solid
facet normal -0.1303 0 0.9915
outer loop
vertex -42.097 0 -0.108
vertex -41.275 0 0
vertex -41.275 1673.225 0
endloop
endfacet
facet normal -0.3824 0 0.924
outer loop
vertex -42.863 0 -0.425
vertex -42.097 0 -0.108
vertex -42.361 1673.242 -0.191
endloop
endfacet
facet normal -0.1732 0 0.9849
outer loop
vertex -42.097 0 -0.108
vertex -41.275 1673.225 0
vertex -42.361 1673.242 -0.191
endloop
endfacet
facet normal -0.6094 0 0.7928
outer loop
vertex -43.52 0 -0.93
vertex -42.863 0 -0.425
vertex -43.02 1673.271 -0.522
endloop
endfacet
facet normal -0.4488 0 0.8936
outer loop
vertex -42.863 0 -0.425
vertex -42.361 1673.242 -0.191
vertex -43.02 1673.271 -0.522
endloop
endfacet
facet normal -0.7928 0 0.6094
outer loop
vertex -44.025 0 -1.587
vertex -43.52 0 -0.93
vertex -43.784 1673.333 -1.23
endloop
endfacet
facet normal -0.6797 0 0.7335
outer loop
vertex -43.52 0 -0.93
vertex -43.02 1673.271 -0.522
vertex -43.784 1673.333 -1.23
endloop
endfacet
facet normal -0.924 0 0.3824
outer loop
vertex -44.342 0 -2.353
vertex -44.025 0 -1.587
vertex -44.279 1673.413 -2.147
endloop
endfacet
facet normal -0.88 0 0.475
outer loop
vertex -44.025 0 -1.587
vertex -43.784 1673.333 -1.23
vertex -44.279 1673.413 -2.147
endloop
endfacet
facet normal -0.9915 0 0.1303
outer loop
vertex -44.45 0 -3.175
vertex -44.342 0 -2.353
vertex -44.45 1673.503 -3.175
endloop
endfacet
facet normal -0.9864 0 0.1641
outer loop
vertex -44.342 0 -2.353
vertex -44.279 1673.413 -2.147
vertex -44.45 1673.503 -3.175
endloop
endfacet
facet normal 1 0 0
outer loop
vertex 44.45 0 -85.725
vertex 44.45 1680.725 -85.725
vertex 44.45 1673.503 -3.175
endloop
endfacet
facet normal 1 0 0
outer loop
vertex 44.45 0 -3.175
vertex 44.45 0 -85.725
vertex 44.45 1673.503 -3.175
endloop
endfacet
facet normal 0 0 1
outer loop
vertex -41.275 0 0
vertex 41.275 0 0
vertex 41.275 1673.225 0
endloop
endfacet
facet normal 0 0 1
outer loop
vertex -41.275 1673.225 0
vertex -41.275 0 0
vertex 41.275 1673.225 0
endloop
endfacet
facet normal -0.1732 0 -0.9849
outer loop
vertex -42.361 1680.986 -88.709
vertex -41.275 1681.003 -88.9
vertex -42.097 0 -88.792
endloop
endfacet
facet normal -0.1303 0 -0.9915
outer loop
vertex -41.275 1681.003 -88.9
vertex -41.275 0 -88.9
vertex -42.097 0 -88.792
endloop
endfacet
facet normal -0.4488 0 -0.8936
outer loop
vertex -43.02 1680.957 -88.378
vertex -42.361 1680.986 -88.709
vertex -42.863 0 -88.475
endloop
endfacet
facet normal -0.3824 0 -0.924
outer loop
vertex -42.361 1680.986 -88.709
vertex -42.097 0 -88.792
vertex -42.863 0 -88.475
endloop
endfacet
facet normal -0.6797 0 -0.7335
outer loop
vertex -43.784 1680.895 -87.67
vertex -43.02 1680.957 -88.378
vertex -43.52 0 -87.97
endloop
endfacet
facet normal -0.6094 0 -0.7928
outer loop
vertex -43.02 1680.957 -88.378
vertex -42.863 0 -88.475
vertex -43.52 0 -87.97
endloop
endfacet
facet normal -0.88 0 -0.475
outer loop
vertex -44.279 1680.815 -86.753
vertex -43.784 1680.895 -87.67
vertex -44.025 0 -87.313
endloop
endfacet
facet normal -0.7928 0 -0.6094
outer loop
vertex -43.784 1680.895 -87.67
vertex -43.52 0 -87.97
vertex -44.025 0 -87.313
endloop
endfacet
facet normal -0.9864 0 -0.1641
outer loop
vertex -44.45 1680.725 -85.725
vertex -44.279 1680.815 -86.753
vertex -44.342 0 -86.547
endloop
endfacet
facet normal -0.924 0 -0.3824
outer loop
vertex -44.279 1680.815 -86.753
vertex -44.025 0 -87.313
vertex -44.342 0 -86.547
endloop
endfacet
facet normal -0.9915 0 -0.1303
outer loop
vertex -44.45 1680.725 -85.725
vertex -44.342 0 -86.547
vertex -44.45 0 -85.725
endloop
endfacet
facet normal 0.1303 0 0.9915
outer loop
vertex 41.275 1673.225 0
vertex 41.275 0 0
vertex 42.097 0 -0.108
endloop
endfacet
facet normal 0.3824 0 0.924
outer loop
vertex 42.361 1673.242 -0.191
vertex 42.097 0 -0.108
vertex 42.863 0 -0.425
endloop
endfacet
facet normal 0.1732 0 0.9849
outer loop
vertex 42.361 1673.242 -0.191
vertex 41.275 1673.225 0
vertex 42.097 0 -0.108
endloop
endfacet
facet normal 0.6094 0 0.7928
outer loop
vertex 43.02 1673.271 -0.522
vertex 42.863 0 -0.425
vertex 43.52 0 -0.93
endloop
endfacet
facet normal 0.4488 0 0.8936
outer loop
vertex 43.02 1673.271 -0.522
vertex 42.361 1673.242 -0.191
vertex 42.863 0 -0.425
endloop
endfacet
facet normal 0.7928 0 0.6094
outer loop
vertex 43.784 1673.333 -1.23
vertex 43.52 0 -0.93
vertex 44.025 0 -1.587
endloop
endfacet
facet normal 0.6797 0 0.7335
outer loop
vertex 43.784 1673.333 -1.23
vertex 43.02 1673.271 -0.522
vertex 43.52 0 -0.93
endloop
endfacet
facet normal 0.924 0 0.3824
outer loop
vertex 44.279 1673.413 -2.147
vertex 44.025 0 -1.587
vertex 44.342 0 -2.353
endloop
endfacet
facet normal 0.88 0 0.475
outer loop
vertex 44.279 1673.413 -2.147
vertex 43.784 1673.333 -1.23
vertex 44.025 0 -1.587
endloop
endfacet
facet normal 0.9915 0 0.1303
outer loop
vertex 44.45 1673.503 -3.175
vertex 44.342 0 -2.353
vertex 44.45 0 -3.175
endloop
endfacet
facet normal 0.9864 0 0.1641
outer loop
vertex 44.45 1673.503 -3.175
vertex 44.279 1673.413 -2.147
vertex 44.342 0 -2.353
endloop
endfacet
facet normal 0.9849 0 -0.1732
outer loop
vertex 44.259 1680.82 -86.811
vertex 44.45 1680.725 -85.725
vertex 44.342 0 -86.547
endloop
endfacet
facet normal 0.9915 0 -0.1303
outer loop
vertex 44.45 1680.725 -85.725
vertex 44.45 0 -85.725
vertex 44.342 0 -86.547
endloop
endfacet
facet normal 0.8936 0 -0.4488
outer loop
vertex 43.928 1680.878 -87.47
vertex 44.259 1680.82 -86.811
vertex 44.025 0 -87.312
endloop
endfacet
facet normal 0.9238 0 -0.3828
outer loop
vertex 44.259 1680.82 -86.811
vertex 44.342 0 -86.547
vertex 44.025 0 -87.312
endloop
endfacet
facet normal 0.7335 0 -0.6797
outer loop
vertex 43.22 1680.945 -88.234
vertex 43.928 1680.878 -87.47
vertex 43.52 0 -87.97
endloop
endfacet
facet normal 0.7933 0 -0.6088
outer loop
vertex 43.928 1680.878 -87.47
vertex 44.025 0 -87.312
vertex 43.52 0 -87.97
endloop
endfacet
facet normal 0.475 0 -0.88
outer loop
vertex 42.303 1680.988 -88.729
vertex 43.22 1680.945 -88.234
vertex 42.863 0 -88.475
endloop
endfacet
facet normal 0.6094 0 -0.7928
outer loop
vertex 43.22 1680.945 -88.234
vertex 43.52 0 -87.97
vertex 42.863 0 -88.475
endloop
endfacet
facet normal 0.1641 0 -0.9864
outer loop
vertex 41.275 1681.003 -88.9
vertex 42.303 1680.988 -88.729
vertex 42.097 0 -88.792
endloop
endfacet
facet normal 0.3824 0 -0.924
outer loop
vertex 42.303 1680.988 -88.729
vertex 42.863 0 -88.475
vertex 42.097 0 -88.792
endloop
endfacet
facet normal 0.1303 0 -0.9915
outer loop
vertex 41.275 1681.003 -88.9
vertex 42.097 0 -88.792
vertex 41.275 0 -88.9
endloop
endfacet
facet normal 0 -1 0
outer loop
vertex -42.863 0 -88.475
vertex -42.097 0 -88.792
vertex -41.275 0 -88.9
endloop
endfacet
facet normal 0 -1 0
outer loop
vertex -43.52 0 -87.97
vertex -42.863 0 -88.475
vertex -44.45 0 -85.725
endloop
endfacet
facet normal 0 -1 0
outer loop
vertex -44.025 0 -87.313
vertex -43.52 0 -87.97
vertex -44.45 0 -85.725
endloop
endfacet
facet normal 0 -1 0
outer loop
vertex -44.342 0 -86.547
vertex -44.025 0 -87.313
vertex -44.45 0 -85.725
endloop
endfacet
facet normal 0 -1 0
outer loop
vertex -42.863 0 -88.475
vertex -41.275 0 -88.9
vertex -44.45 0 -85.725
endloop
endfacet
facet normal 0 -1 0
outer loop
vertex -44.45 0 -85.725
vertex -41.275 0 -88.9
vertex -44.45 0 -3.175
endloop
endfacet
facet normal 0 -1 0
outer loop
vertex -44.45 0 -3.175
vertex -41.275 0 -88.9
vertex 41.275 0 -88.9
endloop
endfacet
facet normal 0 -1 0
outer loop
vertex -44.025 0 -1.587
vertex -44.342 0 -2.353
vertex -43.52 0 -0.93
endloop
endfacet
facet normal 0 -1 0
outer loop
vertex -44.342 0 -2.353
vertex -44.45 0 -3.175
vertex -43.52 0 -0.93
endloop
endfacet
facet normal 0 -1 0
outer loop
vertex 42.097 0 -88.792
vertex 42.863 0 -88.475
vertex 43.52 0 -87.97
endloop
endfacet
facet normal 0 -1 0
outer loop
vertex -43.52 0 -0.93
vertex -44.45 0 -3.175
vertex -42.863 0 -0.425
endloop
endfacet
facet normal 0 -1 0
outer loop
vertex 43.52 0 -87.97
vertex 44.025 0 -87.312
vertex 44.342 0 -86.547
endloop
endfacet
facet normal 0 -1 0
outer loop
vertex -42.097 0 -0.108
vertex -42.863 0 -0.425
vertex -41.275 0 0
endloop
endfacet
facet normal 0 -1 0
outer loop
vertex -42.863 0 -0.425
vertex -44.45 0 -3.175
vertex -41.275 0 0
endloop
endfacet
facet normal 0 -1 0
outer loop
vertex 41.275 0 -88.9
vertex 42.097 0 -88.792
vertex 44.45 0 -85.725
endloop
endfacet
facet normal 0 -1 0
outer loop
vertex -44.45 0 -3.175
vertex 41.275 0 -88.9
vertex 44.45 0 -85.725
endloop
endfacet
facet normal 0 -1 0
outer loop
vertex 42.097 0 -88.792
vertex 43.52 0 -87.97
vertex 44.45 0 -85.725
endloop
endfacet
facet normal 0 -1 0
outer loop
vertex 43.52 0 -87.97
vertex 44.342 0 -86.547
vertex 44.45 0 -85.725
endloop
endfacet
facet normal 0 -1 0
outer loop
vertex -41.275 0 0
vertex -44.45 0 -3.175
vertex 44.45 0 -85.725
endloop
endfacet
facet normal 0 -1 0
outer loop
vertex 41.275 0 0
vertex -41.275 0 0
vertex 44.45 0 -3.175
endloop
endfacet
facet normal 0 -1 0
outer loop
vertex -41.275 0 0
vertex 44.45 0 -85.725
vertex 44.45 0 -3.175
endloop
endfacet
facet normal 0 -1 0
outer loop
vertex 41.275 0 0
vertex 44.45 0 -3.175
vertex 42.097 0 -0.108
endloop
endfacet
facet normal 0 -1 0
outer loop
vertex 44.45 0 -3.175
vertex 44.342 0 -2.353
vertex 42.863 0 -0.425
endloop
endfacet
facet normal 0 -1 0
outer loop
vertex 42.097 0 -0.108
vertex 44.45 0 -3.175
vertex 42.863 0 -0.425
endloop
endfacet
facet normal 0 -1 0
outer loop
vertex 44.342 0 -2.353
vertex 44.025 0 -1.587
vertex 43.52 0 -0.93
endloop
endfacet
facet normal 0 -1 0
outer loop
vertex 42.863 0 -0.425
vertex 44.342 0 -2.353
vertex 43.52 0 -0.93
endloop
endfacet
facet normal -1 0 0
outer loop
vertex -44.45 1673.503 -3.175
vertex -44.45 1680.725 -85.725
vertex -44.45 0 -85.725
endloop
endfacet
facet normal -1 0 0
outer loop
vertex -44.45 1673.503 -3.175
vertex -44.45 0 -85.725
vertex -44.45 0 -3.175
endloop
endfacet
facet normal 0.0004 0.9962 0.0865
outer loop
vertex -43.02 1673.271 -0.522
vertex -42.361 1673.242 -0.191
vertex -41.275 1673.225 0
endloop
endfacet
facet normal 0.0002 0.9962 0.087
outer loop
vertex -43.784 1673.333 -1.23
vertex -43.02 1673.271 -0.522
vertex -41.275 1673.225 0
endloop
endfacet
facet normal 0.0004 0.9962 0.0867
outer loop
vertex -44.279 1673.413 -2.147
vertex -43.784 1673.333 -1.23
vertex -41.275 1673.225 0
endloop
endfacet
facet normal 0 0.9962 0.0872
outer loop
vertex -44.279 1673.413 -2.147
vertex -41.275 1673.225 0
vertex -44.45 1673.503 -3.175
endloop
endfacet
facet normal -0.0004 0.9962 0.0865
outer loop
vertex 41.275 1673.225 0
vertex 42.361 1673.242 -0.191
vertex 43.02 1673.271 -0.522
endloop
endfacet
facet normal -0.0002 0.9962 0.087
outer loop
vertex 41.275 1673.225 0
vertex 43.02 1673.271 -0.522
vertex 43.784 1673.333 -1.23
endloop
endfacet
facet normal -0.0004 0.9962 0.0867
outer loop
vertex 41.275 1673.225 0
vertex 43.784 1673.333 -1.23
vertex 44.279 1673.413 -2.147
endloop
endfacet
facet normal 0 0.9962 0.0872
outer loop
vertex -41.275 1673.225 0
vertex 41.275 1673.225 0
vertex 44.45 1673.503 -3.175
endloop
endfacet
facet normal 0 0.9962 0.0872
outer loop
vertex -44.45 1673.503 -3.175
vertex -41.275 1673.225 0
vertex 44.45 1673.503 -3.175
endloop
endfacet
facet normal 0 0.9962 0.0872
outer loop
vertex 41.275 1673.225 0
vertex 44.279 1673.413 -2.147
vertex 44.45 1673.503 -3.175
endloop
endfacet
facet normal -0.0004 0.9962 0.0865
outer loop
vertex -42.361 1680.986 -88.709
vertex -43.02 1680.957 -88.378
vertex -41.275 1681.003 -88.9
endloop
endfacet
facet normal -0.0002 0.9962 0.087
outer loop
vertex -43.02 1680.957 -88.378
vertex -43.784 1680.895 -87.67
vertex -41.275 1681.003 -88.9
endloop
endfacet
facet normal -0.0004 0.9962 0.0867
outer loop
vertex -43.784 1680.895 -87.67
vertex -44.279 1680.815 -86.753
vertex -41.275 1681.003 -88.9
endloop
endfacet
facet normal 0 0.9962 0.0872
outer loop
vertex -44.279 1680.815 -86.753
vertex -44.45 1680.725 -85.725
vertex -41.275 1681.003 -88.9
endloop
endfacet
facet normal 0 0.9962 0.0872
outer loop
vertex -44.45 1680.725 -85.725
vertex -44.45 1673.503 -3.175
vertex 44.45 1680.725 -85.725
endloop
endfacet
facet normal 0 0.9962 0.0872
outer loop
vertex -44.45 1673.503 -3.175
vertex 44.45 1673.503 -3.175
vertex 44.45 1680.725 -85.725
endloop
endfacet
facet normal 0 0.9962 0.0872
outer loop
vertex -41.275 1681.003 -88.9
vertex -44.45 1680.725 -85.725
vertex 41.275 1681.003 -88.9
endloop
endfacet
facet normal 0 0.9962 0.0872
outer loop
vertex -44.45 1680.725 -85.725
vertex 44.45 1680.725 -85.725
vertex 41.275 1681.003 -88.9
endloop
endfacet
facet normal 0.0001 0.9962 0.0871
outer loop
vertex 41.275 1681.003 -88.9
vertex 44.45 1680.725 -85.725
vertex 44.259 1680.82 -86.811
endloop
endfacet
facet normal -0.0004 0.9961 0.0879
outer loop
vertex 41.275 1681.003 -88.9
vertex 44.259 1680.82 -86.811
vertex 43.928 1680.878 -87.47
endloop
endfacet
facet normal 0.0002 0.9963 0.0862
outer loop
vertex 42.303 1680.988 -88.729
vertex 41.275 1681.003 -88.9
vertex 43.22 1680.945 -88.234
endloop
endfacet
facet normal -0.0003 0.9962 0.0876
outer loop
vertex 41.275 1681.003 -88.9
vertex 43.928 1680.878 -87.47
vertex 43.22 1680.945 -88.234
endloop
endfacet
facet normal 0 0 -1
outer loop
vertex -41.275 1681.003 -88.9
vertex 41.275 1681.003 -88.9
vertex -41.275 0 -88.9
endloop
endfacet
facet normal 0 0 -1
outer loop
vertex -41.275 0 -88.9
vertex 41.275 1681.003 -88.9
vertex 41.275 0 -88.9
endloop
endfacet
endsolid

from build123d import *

# Parameters (mm, degrees)
BOSS_EXTRUDE1_DEPTH = 44.45
FILLET1_R           = 3.175


with BuildPart() as part:
    # Sketch1 → Boss-Extrude1 (new, symmetric)
    with BuildSketch(Plane(origin=(0, 0, 0), x_dir=(0, 0, -1), z_dir=(1, 0, 0))):
        Polygon((0, 0), (0, 1673.225), (88.9, 1681.002742187), (88.9, 0), align=None)
    extrude(amount=BOSS_EXTRUDE1_DEPTH, both=True)

    # Fillet1
    fillet1_edges = [part.edges().sort_by_distance(p)[0] for p in [
        (44.45, 836.6125, 0),
        (-44.45, 836.6125, 0),
        (-44.45, 840.501371094, -88.9),
        (44.45, 840.501371094, -88.9),
    ]]
    fillet(fillet1_edges, radius=FILLET1_R)


solid = part.part
